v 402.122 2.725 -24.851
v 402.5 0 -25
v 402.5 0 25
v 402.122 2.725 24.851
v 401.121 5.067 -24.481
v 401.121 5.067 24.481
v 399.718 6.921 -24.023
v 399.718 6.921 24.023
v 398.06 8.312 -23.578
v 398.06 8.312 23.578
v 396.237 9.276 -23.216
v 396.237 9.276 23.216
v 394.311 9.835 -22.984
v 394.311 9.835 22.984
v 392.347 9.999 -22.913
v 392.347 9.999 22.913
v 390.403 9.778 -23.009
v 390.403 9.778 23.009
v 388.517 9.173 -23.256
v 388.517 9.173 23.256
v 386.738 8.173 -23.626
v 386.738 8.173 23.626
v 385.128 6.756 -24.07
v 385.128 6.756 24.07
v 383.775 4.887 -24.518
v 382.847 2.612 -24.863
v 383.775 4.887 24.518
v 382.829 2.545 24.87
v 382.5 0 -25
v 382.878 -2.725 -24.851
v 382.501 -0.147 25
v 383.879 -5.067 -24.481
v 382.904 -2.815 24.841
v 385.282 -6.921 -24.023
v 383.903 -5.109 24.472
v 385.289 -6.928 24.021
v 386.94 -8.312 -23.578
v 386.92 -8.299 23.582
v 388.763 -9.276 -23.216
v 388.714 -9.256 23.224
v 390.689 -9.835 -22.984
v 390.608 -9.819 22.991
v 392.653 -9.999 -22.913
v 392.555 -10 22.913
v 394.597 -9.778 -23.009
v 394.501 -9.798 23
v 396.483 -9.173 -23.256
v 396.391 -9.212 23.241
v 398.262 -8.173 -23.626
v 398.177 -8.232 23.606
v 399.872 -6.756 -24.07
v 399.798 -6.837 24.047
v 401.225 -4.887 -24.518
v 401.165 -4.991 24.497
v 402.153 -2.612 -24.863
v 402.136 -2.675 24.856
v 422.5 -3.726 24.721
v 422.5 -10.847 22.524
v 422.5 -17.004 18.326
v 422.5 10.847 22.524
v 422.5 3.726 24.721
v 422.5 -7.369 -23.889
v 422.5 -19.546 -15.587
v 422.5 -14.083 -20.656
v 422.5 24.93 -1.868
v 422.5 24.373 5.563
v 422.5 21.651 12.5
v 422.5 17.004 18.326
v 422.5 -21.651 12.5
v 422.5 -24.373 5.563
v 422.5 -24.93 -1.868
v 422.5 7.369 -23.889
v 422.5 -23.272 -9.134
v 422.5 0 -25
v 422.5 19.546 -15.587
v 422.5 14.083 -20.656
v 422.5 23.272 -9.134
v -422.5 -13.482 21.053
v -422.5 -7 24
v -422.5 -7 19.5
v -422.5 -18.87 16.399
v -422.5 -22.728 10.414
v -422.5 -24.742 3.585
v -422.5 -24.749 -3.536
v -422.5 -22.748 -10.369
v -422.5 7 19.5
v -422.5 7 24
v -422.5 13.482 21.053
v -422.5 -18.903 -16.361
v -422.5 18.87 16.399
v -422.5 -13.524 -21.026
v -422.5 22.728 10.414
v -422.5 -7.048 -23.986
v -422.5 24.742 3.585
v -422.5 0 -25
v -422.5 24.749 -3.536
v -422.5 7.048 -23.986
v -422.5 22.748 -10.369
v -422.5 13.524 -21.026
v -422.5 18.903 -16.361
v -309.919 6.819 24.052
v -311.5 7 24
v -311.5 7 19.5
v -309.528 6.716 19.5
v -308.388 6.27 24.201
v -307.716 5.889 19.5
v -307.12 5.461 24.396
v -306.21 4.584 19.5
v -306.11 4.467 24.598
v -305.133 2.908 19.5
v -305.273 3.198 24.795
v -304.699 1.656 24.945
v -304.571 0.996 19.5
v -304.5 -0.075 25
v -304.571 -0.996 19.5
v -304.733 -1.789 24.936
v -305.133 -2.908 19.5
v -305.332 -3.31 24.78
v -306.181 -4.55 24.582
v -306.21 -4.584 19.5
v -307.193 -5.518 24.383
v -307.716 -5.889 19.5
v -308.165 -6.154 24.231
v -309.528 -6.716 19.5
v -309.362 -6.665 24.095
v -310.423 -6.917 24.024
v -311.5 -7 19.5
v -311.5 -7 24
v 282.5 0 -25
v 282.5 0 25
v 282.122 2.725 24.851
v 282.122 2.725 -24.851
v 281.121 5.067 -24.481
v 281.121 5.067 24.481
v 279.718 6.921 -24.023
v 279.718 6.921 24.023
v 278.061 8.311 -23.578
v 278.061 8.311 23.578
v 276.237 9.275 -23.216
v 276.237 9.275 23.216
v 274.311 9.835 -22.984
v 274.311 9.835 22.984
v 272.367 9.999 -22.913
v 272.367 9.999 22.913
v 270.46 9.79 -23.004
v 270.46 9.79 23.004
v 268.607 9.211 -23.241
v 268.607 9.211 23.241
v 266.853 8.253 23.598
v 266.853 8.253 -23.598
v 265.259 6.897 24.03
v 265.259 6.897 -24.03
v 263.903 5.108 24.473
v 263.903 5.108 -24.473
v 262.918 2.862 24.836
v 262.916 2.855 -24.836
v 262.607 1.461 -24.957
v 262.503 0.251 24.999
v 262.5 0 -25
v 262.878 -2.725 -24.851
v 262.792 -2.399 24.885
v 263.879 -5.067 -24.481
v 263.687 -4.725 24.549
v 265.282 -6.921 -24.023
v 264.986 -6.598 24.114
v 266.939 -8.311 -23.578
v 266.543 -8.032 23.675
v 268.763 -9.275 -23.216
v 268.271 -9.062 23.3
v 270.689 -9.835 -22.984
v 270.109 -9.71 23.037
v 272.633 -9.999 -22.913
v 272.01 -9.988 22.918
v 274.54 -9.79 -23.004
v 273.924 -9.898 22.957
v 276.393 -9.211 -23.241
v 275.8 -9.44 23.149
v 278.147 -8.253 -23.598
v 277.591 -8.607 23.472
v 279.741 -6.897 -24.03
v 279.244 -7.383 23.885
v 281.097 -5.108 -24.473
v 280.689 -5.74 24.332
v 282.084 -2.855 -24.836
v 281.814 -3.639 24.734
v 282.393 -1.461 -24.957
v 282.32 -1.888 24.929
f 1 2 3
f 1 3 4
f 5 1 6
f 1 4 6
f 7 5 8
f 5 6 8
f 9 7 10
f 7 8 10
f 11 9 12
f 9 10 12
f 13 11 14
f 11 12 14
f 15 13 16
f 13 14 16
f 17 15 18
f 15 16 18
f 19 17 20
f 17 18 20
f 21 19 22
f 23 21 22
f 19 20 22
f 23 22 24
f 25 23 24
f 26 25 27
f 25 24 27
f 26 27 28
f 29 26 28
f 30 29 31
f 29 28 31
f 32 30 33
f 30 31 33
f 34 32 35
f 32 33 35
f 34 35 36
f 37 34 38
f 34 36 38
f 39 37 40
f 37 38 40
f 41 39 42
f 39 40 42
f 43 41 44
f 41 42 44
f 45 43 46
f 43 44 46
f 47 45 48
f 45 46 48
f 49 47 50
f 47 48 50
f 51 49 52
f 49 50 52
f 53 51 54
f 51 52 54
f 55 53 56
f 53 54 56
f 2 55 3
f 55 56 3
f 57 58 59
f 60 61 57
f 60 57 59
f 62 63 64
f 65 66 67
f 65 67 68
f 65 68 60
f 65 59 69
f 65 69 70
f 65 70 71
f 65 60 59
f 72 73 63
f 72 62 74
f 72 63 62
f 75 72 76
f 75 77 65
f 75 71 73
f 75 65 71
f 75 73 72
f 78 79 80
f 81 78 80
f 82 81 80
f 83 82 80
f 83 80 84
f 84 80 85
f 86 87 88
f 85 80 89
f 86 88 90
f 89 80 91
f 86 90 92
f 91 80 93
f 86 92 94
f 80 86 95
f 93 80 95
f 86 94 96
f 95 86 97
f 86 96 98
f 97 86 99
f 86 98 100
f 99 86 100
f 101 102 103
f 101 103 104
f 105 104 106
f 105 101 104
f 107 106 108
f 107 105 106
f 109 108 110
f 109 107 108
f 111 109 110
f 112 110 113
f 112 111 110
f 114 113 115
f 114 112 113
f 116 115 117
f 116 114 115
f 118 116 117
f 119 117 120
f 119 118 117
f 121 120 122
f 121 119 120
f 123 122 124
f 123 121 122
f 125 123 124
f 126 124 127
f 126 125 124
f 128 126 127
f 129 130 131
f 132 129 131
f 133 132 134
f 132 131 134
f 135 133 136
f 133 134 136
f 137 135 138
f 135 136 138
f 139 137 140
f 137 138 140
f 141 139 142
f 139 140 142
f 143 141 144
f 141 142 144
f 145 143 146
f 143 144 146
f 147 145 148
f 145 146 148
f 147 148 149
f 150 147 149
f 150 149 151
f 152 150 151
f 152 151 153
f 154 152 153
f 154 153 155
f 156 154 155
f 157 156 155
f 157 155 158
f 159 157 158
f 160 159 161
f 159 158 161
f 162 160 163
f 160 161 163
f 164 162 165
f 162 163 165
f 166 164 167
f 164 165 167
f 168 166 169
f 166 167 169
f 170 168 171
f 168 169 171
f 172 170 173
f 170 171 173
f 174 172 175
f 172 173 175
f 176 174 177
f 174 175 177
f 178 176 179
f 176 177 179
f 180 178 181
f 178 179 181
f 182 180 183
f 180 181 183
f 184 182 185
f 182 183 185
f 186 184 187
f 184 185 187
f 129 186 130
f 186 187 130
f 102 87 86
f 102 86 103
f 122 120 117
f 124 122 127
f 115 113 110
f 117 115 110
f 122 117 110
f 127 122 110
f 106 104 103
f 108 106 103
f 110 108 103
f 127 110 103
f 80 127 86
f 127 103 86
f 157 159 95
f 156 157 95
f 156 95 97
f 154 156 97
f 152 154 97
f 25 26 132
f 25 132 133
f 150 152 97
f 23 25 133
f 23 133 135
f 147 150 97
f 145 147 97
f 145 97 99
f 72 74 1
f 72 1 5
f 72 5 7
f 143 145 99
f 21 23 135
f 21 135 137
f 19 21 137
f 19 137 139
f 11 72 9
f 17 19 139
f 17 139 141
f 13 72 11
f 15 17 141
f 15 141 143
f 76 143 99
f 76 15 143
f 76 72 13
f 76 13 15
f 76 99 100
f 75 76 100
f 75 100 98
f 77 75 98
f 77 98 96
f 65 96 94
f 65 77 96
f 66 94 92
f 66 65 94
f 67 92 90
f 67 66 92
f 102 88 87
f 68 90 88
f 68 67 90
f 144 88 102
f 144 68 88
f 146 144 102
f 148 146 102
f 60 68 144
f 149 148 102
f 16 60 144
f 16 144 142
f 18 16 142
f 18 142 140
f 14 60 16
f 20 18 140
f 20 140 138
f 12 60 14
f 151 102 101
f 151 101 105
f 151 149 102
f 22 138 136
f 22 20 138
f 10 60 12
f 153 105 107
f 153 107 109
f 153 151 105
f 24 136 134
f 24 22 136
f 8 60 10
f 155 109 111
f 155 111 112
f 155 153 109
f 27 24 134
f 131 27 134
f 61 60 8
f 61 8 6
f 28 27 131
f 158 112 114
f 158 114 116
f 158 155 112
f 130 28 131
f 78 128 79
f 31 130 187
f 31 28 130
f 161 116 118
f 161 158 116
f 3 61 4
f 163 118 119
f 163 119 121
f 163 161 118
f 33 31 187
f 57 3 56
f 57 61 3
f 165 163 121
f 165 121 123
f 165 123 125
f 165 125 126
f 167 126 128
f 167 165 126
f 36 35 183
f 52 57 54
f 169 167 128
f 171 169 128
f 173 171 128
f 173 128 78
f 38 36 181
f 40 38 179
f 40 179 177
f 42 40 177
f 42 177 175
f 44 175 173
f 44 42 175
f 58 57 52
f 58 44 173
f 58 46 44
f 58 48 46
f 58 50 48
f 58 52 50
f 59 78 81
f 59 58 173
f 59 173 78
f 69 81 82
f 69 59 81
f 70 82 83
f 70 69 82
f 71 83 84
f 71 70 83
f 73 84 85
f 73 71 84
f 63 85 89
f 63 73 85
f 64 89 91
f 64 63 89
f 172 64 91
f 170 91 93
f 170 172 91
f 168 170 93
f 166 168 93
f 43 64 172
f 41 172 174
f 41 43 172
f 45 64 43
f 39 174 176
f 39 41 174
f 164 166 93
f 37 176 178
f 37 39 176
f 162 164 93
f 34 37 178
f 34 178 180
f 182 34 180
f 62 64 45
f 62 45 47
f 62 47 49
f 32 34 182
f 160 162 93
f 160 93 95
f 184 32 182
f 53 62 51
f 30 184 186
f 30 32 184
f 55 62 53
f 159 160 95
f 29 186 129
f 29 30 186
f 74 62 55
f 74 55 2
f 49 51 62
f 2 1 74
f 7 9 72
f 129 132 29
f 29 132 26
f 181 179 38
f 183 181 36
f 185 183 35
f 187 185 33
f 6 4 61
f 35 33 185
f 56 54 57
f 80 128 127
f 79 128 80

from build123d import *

# Parameters (mm, degrees)
SKETCH1_R           = 25
BOSS_EXTRUDE1_DEPTH = 422.5
SKETCH2_R           = 10
CUT_EXTRUDE1_DEPTH  = 160
CUT_EXTRUDE3_DEPTH  = 5.5


with BuildPart() as part:
    # Sketch1 → Boss-Extrude1 (new, symmetric)
    with BuildSketch(Plane(origin=(0, 0, 0), x_dir=(0, 0, -1), z_dir=(1, 0, 0))):
        Circle(SKETCH1_R)
    extrude(amount=BOSS_EXTRUDE1_DEPTH, both=True)

    # Sketch2 → Cut-Extrude1 (cut, symmetric)
    with BuildSketch(Plane.XY):
        with Locations((392.5, 0)):
            Circle(SKETCH2_R)
        with Locations((272.5, 0)):
            Circle(SKETCH2_R)
    extrude(amount=CUT_EXTRUDE1_DEPTH, both=True, mode=Mode.SUBTRACT)

    # Sketch4 → Cut-Extrude3 (cut)
    with BuildSketch(Plane.XY.offset(25)):
        with BuildLine():
            Line((-422.5, 7), (-311.5, 7))
            ThreePointArc((-311.5, 7), (-304.5, 0), (-311.5, -7))
            Line((-311.5, -7), (-422.5, -7))
            ThreePointArc((-422.5, -7), (-429.5, 0), (-422.5, 7))
        make_face()
    extrude(amount=-CUT_EXTRUDE3_DEPTH, mode=Mode.SUBTRACT)


solid = part.part
